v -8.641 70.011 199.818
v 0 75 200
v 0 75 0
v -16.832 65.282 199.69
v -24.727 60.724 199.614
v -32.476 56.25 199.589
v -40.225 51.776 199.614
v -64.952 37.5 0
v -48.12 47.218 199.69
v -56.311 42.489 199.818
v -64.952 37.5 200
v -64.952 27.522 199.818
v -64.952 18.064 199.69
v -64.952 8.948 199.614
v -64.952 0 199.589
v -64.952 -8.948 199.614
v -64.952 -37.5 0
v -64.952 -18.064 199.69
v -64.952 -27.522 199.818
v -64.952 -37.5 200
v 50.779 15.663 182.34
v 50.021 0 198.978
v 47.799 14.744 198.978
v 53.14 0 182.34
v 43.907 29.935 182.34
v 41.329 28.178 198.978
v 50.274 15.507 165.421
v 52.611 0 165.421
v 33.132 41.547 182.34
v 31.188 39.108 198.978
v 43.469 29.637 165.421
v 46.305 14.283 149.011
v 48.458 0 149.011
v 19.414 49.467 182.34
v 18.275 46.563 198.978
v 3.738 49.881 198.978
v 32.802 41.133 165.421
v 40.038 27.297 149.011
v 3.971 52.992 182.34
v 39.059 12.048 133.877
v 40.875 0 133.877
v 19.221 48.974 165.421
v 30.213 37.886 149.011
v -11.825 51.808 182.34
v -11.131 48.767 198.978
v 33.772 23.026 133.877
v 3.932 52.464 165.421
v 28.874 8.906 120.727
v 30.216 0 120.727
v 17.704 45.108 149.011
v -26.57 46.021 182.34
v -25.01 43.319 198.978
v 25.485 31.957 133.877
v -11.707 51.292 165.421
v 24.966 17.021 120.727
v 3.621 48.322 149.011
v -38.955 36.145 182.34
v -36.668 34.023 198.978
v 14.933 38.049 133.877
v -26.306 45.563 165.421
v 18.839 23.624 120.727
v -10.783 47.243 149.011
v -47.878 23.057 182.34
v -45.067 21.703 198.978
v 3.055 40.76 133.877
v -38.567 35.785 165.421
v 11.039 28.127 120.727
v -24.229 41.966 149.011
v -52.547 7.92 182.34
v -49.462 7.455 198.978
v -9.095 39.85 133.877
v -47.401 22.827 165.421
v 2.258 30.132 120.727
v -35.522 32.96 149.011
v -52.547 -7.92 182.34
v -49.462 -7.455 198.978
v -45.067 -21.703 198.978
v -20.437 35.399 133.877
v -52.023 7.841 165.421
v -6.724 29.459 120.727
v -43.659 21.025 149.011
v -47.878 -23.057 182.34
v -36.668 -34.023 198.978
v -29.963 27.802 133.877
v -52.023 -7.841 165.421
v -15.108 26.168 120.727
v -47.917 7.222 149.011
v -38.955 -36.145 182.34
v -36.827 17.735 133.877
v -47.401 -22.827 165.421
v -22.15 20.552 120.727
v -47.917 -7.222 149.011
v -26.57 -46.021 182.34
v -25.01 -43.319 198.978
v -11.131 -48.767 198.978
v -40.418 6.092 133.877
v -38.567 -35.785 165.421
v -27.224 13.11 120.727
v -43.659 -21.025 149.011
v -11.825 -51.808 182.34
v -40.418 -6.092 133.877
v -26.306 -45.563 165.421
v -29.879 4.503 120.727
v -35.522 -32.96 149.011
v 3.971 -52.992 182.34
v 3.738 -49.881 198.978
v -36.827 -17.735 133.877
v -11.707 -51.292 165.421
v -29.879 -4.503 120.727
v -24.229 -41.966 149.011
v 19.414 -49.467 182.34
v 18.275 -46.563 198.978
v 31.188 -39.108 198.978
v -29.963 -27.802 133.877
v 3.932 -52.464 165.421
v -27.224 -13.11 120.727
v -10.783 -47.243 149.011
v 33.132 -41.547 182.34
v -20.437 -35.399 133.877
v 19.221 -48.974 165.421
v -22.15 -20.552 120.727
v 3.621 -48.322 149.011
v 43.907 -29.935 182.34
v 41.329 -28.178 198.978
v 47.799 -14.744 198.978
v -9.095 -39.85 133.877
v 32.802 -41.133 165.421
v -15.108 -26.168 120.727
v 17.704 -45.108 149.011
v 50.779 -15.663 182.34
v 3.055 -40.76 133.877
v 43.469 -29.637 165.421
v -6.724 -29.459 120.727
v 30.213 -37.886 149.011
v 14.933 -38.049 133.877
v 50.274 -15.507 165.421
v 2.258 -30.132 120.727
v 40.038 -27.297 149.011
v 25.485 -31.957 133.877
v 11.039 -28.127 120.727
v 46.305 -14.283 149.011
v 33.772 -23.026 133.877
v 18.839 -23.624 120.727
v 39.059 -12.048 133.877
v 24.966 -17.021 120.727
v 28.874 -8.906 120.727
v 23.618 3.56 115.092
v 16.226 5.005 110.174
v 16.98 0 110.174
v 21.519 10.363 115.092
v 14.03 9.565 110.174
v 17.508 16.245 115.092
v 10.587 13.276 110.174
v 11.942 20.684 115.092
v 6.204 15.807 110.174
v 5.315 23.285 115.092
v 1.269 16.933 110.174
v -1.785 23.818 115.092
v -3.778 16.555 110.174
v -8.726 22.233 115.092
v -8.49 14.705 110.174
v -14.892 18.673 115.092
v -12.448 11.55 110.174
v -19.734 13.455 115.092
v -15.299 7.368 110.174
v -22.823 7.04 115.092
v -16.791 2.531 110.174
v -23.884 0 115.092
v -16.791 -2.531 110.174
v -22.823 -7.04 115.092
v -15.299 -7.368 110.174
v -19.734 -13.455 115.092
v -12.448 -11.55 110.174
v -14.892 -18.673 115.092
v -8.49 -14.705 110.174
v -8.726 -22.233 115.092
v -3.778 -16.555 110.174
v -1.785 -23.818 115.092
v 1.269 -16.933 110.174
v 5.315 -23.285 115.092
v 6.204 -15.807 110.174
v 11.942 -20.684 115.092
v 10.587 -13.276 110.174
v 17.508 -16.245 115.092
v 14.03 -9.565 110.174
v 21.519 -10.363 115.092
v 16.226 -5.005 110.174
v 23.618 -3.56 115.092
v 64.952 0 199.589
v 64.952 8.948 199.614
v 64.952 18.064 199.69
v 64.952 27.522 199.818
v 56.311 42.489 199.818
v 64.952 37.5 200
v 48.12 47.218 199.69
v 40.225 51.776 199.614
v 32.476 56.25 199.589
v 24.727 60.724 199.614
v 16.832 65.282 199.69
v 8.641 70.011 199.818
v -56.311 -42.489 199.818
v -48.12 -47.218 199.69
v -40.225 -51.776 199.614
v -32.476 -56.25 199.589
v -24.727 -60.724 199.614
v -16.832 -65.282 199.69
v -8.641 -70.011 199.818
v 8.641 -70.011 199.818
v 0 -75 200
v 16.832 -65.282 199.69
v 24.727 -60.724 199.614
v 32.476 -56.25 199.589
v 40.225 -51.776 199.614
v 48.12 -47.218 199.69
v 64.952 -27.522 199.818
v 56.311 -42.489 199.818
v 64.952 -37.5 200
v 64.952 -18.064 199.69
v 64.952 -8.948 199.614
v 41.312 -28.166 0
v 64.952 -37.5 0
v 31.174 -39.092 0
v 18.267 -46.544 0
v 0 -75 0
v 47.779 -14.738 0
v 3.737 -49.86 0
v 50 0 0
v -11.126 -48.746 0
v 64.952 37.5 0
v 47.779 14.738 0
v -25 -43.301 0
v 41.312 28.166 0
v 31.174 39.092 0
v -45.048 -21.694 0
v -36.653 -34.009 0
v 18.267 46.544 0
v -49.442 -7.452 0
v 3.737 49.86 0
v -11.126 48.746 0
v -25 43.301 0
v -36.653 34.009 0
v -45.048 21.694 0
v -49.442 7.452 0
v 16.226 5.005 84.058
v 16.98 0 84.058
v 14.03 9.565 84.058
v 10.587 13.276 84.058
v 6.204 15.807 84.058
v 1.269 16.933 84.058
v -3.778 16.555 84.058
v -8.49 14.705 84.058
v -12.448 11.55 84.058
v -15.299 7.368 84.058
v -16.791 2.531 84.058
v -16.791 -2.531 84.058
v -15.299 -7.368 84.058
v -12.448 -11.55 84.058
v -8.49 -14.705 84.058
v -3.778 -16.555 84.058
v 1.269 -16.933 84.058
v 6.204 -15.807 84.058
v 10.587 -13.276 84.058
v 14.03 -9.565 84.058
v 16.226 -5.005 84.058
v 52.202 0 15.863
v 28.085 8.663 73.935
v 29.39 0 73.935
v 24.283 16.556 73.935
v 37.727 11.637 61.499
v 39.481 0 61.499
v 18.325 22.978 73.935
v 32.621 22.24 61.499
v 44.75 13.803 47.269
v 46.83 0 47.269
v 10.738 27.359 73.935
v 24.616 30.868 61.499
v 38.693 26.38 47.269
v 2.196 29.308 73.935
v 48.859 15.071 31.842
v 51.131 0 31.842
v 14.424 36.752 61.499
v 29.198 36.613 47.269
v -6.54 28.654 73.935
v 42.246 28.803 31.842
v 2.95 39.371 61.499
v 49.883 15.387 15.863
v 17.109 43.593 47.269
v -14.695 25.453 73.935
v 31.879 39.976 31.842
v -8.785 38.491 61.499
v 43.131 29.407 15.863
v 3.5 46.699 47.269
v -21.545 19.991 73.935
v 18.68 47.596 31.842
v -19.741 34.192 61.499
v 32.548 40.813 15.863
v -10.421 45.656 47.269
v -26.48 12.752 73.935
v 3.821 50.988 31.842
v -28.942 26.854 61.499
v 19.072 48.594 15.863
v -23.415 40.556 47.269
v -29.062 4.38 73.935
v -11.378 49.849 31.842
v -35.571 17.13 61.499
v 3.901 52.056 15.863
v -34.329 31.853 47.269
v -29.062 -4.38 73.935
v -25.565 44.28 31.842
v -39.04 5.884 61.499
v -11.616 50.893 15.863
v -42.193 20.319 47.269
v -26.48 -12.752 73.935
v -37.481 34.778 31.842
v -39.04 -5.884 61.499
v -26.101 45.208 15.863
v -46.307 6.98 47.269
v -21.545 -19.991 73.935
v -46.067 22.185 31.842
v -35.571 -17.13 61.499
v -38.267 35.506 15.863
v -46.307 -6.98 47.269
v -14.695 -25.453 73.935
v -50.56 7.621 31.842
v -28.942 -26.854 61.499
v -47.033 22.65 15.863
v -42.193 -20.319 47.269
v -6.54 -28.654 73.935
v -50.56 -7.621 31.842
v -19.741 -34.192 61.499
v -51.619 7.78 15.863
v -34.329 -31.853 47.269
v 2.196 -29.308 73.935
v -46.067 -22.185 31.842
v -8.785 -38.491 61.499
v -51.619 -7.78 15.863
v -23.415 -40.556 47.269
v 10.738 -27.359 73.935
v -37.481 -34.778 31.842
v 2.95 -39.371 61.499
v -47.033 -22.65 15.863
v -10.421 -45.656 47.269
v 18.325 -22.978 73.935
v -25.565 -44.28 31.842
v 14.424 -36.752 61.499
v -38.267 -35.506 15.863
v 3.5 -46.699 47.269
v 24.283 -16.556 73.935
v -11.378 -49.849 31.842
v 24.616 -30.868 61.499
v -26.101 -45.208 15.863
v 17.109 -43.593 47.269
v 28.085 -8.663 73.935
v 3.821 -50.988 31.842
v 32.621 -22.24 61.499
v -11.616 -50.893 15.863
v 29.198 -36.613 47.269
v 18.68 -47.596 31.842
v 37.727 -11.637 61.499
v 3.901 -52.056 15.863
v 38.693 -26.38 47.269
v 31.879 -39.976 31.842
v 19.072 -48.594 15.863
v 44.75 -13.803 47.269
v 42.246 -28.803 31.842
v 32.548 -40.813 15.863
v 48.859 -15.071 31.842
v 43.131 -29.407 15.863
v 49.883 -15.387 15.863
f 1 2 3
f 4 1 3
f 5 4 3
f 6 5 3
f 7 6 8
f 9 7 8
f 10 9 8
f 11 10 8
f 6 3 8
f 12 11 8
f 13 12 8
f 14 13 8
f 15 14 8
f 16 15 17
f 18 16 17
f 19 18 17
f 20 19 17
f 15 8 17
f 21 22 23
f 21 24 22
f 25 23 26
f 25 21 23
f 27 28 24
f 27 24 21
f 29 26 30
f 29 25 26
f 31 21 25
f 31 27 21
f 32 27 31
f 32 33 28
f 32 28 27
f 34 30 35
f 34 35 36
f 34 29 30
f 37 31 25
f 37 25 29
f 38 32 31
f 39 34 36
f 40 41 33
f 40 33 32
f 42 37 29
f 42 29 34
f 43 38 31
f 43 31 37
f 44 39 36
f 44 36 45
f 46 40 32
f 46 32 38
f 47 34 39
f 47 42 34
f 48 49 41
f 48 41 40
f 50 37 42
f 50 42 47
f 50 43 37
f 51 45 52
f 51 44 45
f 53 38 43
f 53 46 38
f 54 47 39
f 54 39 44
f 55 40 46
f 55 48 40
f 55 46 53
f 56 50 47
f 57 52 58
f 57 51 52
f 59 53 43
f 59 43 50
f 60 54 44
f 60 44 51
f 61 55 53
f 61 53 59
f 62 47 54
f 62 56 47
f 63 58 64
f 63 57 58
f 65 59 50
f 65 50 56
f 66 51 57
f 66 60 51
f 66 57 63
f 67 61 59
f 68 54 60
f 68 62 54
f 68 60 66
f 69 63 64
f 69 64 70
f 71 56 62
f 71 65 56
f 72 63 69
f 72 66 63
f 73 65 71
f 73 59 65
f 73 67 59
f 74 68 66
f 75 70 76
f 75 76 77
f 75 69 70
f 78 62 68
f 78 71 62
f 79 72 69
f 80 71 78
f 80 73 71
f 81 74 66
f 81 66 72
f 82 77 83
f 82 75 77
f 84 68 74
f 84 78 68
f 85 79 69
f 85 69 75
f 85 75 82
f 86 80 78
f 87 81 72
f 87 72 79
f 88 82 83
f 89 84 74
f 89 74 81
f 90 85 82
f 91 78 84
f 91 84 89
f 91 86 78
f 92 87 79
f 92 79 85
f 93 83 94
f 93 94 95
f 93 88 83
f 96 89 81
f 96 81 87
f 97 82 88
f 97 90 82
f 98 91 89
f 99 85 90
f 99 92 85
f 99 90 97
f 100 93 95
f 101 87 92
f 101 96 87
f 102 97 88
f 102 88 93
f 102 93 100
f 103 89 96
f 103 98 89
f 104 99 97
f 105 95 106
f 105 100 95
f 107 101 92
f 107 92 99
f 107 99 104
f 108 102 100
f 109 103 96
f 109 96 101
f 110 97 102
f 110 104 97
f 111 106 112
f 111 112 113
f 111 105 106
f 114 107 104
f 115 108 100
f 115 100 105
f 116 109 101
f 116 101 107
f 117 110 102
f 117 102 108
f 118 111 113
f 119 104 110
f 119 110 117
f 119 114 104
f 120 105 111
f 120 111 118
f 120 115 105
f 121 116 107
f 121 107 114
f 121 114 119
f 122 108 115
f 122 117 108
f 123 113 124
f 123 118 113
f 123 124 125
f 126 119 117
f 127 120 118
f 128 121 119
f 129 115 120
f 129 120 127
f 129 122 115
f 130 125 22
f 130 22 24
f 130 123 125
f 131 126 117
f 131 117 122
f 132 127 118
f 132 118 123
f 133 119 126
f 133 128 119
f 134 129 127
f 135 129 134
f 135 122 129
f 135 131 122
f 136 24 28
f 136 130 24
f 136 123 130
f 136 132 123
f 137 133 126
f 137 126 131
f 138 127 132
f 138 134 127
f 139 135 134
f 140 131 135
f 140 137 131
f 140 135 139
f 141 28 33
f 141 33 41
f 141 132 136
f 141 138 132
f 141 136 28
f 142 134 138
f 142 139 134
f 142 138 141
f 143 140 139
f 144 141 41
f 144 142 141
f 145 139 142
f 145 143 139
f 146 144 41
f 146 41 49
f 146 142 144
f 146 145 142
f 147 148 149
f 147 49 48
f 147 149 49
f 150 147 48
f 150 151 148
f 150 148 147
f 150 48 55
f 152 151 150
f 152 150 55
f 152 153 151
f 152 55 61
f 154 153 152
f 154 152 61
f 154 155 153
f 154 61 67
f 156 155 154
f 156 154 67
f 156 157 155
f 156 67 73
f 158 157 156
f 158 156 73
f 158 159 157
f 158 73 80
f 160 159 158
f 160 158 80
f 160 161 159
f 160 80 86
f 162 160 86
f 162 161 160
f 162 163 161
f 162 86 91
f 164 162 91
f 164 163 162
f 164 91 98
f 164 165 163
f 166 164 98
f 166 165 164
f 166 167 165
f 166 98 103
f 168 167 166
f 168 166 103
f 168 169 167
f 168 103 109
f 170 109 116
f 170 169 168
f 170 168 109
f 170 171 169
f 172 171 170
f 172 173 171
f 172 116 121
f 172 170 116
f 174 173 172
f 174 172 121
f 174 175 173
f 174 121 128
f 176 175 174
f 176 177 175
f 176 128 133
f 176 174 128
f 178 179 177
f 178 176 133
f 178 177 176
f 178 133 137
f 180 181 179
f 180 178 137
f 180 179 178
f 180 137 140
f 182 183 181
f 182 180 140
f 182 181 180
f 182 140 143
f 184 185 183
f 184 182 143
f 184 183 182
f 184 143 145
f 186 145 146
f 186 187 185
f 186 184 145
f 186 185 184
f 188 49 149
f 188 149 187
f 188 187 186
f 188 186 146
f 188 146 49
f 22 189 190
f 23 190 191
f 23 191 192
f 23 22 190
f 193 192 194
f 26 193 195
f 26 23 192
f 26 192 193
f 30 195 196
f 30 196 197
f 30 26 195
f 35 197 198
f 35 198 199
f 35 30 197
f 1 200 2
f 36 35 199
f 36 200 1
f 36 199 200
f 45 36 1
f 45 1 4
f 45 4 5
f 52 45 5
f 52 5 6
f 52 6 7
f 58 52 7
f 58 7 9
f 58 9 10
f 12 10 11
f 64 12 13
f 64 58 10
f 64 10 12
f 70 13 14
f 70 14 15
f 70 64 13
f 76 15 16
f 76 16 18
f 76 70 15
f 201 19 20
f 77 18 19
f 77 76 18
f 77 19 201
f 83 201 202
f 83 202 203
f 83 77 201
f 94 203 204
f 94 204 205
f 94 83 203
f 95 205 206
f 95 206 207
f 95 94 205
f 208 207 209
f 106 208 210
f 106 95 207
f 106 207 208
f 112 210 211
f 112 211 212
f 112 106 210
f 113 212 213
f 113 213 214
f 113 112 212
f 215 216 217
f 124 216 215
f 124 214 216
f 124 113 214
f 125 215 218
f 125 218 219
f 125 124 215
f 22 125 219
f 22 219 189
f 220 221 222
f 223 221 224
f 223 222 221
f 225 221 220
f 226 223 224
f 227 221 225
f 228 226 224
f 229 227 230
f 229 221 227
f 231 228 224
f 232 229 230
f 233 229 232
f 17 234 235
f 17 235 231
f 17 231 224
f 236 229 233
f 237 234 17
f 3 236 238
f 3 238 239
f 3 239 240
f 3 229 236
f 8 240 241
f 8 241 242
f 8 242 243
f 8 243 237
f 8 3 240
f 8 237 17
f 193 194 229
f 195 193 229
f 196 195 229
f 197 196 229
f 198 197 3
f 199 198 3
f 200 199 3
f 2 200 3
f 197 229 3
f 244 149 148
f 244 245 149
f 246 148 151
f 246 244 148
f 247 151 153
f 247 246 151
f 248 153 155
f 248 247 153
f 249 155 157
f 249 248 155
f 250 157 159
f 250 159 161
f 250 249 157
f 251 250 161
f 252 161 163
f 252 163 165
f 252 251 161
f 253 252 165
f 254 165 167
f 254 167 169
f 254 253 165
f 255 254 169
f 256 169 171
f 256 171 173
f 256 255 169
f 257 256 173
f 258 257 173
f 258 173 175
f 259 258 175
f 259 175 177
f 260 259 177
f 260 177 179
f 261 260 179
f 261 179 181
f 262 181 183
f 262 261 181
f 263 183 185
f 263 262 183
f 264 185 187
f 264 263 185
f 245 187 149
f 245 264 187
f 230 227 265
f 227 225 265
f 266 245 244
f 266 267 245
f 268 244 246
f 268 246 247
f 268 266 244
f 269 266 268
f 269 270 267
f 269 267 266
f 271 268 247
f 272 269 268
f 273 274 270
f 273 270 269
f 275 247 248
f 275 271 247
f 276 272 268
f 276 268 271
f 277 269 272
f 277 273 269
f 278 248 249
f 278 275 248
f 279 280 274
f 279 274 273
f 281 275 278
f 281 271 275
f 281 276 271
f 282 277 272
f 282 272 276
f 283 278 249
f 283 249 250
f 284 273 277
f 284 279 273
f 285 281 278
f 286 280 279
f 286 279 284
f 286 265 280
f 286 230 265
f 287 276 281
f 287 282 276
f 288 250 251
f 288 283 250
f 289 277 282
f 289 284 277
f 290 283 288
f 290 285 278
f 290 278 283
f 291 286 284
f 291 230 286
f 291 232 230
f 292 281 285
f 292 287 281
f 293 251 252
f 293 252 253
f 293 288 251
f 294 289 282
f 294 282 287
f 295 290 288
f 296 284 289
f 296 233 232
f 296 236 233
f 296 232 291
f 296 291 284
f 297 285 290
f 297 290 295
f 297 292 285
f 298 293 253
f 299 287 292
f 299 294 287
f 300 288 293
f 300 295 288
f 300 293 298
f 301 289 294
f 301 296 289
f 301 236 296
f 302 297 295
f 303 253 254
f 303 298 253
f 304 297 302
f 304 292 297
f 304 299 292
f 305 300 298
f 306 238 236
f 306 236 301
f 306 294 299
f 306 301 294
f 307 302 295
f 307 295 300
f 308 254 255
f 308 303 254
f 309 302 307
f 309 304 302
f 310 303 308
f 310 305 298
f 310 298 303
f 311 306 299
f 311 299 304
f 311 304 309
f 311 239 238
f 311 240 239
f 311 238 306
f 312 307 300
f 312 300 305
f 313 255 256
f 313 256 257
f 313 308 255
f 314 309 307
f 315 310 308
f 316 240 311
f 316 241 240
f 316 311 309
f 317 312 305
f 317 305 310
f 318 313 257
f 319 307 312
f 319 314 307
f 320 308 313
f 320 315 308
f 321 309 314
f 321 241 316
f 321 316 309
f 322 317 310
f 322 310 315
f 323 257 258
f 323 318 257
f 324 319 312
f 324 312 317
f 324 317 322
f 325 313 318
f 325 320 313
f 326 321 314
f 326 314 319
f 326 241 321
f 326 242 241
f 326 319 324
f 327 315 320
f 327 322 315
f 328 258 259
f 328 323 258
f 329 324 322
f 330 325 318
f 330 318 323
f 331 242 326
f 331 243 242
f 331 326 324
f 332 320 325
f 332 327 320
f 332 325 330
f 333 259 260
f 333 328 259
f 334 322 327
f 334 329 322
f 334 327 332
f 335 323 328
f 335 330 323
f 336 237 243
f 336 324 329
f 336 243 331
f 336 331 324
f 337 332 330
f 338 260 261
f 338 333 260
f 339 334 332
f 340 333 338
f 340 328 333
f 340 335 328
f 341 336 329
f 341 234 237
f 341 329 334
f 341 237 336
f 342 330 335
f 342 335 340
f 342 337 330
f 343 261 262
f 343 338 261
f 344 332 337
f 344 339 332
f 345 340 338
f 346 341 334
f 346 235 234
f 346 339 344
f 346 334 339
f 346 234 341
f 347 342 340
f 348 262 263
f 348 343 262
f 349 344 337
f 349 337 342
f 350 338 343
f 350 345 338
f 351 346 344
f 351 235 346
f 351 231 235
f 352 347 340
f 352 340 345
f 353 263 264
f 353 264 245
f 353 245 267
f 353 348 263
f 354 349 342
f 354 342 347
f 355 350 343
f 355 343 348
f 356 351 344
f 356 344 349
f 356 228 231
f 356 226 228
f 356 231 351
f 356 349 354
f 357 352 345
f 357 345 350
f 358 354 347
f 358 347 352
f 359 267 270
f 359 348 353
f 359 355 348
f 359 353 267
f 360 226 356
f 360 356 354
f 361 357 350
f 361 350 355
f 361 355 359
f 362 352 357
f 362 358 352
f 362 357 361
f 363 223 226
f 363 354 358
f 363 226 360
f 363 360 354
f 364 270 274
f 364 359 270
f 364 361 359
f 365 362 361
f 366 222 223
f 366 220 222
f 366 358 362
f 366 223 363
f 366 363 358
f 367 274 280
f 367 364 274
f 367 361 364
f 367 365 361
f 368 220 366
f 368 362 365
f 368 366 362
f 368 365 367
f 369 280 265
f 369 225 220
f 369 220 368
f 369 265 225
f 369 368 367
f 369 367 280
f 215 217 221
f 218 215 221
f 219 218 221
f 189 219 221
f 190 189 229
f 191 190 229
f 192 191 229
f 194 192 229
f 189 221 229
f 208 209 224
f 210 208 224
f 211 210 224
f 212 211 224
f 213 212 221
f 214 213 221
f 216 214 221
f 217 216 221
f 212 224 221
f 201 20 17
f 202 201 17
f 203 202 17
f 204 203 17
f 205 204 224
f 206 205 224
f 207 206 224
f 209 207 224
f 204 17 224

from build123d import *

# Parameters (mm, degrees)
F3_DEPTH = 206.616135


with BuildPart() as f1:
    # F0 (on Front) → F1 (revolve)
    with BuildSketch(Plane.XZ):
        with BuildLine():
            ThreePointArc((16.980399, 84.057986), (46.830312, 47.269247), (50, 0))
            Line((50, 0), (75, 0))
            Line((75, 0), (75, 200))
            Line((75, 200), (50.020899, 198.977988))
            ThreePointArc((50.020899, 198.977988), (48.457809, 149.011176), (16.980399, 110.174363))
            Line((16.980399, 110.174363), (16.980399, 84.057986))
        make_face()
    revolve(axis=Axis((0, 0, 42.679031), (0, 0, 1)))

    # F2 (on Top) → F3 (intersect)
    with BuildSketch(Plane.XY):
        Polygon((-64.951905, 37.5), (-64.951905, -37.5), (0, -75), (64.951905, -37.5), (64.951905, 37.5), (0, 75), align=None)
    extrude(amount=F3_DEPTH, mode=Mode.INTERSECT)


solid = f1.part
